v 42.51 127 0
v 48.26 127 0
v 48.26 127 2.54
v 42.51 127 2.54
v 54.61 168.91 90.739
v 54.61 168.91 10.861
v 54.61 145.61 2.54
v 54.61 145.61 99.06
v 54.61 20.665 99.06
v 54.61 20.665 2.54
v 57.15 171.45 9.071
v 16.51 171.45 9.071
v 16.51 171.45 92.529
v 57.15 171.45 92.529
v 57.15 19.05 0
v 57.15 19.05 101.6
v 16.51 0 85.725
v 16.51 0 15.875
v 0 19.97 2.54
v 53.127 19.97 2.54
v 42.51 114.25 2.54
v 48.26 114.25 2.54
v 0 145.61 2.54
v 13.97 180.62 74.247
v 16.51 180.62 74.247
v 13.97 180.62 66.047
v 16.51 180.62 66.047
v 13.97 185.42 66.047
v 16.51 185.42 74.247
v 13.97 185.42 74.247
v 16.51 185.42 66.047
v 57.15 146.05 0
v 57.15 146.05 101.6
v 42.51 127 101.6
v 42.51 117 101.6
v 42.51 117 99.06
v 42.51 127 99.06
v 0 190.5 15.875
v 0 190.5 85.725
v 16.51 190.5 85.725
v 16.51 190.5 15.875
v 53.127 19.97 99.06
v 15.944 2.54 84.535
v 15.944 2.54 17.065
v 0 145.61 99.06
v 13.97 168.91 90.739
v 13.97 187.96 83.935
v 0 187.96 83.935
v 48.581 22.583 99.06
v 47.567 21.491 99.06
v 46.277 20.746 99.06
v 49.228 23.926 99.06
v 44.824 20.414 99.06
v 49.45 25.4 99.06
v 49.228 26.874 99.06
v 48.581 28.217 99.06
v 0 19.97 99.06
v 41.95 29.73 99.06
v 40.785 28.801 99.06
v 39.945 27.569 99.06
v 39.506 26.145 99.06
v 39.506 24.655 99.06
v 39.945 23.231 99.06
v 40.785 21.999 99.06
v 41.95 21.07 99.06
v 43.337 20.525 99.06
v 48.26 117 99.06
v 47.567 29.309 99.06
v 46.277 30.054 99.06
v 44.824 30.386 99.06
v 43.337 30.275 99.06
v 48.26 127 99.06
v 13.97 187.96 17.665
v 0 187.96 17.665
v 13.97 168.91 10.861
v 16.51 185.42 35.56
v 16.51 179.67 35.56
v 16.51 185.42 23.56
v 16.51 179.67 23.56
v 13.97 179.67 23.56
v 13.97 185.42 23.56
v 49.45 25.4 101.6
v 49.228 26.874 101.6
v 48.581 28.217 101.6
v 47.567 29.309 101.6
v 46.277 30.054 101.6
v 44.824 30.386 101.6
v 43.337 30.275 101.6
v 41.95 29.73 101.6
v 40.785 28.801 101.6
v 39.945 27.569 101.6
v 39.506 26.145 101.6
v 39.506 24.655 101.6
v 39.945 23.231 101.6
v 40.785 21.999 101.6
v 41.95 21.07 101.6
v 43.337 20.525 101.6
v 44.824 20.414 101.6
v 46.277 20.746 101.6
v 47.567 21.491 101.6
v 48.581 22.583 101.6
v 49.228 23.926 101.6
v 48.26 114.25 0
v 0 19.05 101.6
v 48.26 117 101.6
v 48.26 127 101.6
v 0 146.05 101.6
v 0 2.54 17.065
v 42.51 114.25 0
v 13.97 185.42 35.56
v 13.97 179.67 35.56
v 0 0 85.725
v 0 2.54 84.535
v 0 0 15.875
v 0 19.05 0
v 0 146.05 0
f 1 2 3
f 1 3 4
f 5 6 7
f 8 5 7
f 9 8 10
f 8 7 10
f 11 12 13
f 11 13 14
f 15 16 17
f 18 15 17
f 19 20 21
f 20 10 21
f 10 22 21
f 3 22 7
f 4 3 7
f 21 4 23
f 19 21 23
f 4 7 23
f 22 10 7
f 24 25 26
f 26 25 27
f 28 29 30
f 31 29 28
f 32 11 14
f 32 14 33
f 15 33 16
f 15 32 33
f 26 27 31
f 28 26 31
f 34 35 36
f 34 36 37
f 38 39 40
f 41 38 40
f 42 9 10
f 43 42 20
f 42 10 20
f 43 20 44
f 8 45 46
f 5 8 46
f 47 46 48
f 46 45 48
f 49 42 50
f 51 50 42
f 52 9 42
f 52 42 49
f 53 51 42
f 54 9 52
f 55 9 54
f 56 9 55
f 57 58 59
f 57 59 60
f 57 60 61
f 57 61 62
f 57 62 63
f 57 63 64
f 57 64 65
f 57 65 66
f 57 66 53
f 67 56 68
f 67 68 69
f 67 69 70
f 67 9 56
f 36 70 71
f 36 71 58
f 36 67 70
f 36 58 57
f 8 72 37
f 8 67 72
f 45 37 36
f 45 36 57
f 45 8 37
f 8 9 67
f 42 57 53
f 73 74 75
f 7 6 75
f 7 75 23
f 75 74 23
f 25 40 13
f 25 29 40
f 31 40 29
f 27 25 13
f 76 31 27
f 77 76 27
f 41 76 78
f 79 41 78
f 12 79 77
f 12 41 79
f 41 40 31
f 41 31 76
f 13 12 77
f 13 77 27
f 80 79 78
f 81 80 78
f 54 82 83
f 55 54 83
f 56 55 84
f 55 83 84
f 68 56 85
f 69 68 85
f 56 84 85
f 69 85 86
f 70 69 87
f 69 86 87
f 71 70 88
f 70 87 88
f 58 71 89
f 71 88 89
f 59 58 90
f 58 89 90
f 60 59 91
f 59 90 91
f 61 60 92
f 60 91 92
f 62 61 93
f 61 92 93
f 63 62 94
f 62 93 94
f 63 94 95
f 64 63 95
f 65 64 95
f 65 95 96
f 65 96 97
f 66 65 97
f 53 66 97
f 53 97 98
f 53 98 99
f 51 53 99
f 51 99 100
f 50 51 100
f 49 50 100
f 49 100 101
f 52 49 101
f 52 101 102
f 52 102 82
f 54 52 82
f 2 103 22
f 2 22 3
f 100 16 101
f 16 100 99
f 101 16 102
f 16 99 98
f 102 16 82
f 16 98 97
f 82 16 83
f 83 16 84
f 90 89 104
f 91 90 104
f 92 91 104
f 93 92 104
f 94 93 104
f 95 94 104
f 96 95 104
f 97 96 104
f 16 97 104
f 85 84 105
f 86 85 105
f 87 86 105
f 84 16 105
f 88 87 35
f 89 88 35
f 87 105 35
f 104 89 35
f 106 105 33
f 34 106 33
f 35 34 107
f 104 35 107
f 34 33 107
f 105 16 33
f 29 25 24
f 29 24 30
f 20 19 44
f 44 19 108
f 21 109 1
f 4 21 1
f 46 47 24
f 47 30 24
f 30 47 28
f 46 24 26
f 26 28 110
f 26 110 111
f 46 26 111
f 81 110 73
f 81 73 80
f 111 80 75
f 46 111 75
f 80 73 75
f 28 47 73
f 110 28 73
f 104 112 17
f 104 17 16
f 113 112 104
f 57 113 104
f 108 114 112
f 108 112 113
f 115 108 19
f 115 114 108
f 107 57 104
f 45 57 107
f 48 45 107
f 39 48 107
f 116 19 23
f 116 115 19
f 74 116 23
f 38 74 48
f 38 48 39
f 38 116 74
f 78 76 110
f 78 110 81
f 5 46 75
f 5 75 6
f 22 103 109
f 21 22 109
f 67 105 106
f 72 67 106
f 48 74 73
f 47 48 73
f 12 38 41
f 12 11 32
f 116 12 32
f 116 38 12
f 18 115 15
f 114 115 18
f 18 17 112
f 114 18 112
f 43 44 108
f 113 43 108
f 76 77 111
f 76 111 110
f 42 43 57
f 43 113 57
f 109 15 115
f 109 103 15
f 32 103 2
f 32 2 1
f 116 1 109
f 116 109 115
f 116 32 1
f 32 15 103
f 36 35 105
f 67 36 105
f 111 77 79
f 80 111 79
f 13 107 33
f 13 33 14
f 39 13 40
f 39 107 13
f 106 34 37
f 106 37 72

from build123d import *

# Parameters (mm, degrees)
BOSS_EXTRUDE2_DEPTH = 101.6
CUT_EXTRUDE1_DEPTH  = 58.15
SHELL1_T            = -2.54
SKETCH3_W           = 8.2
SKETCH3_H           = 4.8
SKETCH3_W_2         = 12
SKETCH3_H_2         = 5.75
CUT_EXTRUDE2_DEPTH  = 17.51
SKETCH4_W           = 5.75
SKETCH4_H           = 10
CUT_EXTRUDE3_DEPTH  = 27.94
SKETCH5_W           = 5.75
SKETCH5_H           = 12.75
CUT_EXTRUDE4_DEPTH  = 27.94
SKETCH6_R           = 5
CUT_EXTRUDE5_DEPTH  = 27.94


with BuildPart() as part:
    # Sketch1 → Boss-Extrude2 (new body)
    with BuildSketch(Plane.XY):
        Polygon((0, 0), (0, 190.5), (16.51, 190.5), (16.51, 171.45), (57.15, 171.45), (57.15, 19.05), (16.51, 0), align=None)
    extrude(amount=BOSS_EXTRUDE2_DEPTH)

    # Sketch2 → Cut-Extrude1 (cut, through all)
    with BuildSketch(Plane.ZY):
        Polygon((15.875, 190.5), (0, 146.05), (0, 190.5), align=None)
        Polygon((0, 19.05), (15.875, 0), (0, 0), align=None)
        Polygon((85.725, 0), (101.6, 19.05), (101.6, 0), align=None)
        Polygon((101.6, 146.05), (85.725, 190.5), (101.6, 190.5), align=None)
    extrude(amount=-CUT_EXTRUDE1_DEPTH, mode=Mode.SUBTRACT)

    # Shell1
    shell1_openings = [part.faces().sort_by_distance(p)[0] for p in [
        (0, 88.9, 50.8),
    ]]
    offset(amount=SHELL1_T, openings=shell1_openings, kind=Kind.INTERSECTION)

    # Sketch3 → Cut-Extrude2 (cut, through all)
    with BuildSketch(Plane(origin=(16.51, 0, 0), x_dir=(0, 0, -1), z_dir=(1, 0, 0))):
        with Locations((-70.147400598, 183.02)):
            Rectangle(SKETCH3_W, SKETCH3_H)
        with Locations((-29.56, 182.545)):
            Rectangle(SKETCH3_W_2, SKETCH3_H_2)
    extrude(amount=-CUT_EXTRUDE2_DEPTH, mode=Mode.SUBTRACT)

    # Sketch4 → Cut-Extrude3 (cut)
    with BuildSketch(Plane.XY.offset(101.6)):
        with Locations((45.385, 122)):
            Rectangle(SKETCH4_W, SKETCH4_H)
    extrude(amount=-CUT_EXTRUDE3_DEPTH, mode=Mode.SUBTRACT)

    # Sketch5 → Cut-Extrude4 (cut)
    with BuildSketch(Plane(origin=(0, 0, 0), x_dir=(-1, 0, 0), z_dir=(0, 0, -1))):
        with Locations((-45.385, 120.625)):
            Rectangle(SKETCH5_W, SKETCH5_H)
    extrude(amount=-CUT_EXTRUDE4_DEPTH, mode=Mode.SUBTRACT)

    # Sketch6 → Cut-Extrude5 (cut)
    with BuildSketch(Plane.XY.offset(101.6)):
        with Locations((44.45, 25.4)):
            Circle(SKETCH6_R)
    extrude(amount=-CUT_EXTRUDE5_DEPTH, mode=Mode.SUBTRACT)


solid = part.part
